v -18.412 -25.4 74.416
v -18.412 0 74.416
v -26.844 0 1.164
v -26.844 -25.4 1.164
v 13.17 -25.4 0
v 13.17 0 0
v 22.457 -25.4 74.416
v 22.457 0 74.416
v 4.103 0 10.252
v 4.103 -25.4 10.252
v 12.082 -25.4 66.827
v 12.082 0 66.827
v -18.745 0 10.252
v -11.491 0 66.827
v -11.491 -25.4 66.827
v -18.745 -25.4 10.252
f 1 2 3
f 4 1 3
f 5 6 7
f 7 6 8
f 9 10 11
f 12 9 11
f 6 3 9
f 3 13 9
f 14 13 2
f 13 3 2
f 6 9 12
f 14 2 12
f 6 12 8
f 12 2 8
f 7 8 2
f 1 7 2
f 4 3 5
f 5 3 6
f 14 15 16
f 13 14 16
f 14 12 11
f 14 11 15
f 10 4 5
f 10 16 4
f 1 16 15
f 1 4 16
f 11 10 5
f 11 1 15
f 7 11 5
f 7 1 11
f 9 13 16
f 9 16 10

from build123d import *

# Parameters (mm, degrees)
F1_DEPTH = 76.2
F3_DEPTH = 25.4
F4_DEPTH = 25.4
F5_DEPTH = 38.1
F6_DEPTH = 38.1
F7_DEPTH = 38.1
F8_DEPTH = 38.1
F9_DEPTH = 38.1


with BuildPart() as f1:
    # F0 (on Front) → F1 (new body)
    with BuildSketch(Plane.XZ):
        Polygon((22.4569932461, 74.4162100717), (-18.4116067539, 74.4162100717), (-26.8437221389, 1.1637246492), (13.1697589532, 0), align=None)
    extrude(amount=F1_DEPTH)

    # F2 (on Front) + F1_face (on face) → F3 (cut)
    with BuildSketch(Plane.XZ):
        Polygon((12.081772089, 66.8269023299), (-11.4912800491, 66.8269023299), (-18.7445282936, 10.2515770122), (4.1031986475, 10.2515770122), align=None)
    with BuildSketch(Plane(origin=(-2.3405186652, -76.2, 37.6069334432), x_dir=(1, 0, 0), z_dir=(0, -1, 0))):
        Polygon((-24.5032034737, -36.443208794), (15.5102776183, -37.6069334432), (24.7975119113, 36.8092766285), (-16.0710880887, 36.8092766285), align=None)
    extrude(amount=-F3_DEPTH, mode=Mode.SUBTRACT)

    # F2 (on Front) + F3_face (on face) → F4 (cut)
    with BuildSketch(Plane.XZ):
        Polygon((12.081772089, 66.8269023299), (-11.4912800491, 66.8269023299), (-18.7445282936, 10.2515770122), (4.1031986475, 10.2515770122), align=None)
    with BuildSketch(Plane(origin=(-2.3405186652, -50.8, 37.6069334432), x_dir=(1, 0, 0), z_dir=(0, -1, 0))):
        Polygon((-16.0710880887, 36.8092766285), (-24.5032034737, -36.443208794), (15.5102776183, -37.6069334432), (24.7975119113, 36.8092766285), align=None)
    extrude(amount=-F4_DEPTH, mode=Mode.SUBTRACT)

    # F2 (on Front) → F5 (cut, symmetric)
    with BuildSketch(Plane.XZ):
        Polygon((12.081772089, 66.8269023299), (-11.4912800491, 66.8269023299), (-18.7445282936, 10.2515770122), (4.1031986475, 10.2515770122), align=None)
    extrude(amount=F5_DEPTH, both=True, mode=Mode.SUBTRACT)

    # F2 (on Front) → F6 (join, symmetric)
    with BuildSketch(Plane.XZ):
        Polygon((12.081772089, 66.8269023299), (-11.4912800491, 66.8269023299), (-18.7445282936, 10.2515770122), (4.1031986475, 10.2515770122), align=None)
    extrude(amount=F6_DEPTH, both=True)

    # F7 (cut, symmetric): a face of the model
    f7_faces = [f1.faces().sort_by_distance(p)[0] for p in [
        (-3.4928762861, -38.1, 38.6865713538),
    ]]
    extrude(f7_faces, amount=F7_DEPTH, both=True, mode=Mode.SUBTRACT)

    # F8 (cut, symmetric): a face of the model
    f8_faces = [f1.faces().sort_by_distance(p)[0] for p in [
        (-3.4928762861, 38.1, 38.6865713538),
    ]]
    extrude(f8_faces, amount=F8_DEPTH, both=True, mode=Mode.SUBTRACT)

    # F2 (on Front) → F9 (cut, symmetric)
    with BuildSketch(Plane.XZ):
        Polygon((12.081772089, 66.8269023299), (-11.4912800491, 66.8269023299), (-18.7445282936, 10.2515770122), (4.1031986475, 10.2515770122), align=None)
    extrude(amount=F9_DEPTH, both=True, mode=Mode.SUBTRACT)


solid = f1.part
